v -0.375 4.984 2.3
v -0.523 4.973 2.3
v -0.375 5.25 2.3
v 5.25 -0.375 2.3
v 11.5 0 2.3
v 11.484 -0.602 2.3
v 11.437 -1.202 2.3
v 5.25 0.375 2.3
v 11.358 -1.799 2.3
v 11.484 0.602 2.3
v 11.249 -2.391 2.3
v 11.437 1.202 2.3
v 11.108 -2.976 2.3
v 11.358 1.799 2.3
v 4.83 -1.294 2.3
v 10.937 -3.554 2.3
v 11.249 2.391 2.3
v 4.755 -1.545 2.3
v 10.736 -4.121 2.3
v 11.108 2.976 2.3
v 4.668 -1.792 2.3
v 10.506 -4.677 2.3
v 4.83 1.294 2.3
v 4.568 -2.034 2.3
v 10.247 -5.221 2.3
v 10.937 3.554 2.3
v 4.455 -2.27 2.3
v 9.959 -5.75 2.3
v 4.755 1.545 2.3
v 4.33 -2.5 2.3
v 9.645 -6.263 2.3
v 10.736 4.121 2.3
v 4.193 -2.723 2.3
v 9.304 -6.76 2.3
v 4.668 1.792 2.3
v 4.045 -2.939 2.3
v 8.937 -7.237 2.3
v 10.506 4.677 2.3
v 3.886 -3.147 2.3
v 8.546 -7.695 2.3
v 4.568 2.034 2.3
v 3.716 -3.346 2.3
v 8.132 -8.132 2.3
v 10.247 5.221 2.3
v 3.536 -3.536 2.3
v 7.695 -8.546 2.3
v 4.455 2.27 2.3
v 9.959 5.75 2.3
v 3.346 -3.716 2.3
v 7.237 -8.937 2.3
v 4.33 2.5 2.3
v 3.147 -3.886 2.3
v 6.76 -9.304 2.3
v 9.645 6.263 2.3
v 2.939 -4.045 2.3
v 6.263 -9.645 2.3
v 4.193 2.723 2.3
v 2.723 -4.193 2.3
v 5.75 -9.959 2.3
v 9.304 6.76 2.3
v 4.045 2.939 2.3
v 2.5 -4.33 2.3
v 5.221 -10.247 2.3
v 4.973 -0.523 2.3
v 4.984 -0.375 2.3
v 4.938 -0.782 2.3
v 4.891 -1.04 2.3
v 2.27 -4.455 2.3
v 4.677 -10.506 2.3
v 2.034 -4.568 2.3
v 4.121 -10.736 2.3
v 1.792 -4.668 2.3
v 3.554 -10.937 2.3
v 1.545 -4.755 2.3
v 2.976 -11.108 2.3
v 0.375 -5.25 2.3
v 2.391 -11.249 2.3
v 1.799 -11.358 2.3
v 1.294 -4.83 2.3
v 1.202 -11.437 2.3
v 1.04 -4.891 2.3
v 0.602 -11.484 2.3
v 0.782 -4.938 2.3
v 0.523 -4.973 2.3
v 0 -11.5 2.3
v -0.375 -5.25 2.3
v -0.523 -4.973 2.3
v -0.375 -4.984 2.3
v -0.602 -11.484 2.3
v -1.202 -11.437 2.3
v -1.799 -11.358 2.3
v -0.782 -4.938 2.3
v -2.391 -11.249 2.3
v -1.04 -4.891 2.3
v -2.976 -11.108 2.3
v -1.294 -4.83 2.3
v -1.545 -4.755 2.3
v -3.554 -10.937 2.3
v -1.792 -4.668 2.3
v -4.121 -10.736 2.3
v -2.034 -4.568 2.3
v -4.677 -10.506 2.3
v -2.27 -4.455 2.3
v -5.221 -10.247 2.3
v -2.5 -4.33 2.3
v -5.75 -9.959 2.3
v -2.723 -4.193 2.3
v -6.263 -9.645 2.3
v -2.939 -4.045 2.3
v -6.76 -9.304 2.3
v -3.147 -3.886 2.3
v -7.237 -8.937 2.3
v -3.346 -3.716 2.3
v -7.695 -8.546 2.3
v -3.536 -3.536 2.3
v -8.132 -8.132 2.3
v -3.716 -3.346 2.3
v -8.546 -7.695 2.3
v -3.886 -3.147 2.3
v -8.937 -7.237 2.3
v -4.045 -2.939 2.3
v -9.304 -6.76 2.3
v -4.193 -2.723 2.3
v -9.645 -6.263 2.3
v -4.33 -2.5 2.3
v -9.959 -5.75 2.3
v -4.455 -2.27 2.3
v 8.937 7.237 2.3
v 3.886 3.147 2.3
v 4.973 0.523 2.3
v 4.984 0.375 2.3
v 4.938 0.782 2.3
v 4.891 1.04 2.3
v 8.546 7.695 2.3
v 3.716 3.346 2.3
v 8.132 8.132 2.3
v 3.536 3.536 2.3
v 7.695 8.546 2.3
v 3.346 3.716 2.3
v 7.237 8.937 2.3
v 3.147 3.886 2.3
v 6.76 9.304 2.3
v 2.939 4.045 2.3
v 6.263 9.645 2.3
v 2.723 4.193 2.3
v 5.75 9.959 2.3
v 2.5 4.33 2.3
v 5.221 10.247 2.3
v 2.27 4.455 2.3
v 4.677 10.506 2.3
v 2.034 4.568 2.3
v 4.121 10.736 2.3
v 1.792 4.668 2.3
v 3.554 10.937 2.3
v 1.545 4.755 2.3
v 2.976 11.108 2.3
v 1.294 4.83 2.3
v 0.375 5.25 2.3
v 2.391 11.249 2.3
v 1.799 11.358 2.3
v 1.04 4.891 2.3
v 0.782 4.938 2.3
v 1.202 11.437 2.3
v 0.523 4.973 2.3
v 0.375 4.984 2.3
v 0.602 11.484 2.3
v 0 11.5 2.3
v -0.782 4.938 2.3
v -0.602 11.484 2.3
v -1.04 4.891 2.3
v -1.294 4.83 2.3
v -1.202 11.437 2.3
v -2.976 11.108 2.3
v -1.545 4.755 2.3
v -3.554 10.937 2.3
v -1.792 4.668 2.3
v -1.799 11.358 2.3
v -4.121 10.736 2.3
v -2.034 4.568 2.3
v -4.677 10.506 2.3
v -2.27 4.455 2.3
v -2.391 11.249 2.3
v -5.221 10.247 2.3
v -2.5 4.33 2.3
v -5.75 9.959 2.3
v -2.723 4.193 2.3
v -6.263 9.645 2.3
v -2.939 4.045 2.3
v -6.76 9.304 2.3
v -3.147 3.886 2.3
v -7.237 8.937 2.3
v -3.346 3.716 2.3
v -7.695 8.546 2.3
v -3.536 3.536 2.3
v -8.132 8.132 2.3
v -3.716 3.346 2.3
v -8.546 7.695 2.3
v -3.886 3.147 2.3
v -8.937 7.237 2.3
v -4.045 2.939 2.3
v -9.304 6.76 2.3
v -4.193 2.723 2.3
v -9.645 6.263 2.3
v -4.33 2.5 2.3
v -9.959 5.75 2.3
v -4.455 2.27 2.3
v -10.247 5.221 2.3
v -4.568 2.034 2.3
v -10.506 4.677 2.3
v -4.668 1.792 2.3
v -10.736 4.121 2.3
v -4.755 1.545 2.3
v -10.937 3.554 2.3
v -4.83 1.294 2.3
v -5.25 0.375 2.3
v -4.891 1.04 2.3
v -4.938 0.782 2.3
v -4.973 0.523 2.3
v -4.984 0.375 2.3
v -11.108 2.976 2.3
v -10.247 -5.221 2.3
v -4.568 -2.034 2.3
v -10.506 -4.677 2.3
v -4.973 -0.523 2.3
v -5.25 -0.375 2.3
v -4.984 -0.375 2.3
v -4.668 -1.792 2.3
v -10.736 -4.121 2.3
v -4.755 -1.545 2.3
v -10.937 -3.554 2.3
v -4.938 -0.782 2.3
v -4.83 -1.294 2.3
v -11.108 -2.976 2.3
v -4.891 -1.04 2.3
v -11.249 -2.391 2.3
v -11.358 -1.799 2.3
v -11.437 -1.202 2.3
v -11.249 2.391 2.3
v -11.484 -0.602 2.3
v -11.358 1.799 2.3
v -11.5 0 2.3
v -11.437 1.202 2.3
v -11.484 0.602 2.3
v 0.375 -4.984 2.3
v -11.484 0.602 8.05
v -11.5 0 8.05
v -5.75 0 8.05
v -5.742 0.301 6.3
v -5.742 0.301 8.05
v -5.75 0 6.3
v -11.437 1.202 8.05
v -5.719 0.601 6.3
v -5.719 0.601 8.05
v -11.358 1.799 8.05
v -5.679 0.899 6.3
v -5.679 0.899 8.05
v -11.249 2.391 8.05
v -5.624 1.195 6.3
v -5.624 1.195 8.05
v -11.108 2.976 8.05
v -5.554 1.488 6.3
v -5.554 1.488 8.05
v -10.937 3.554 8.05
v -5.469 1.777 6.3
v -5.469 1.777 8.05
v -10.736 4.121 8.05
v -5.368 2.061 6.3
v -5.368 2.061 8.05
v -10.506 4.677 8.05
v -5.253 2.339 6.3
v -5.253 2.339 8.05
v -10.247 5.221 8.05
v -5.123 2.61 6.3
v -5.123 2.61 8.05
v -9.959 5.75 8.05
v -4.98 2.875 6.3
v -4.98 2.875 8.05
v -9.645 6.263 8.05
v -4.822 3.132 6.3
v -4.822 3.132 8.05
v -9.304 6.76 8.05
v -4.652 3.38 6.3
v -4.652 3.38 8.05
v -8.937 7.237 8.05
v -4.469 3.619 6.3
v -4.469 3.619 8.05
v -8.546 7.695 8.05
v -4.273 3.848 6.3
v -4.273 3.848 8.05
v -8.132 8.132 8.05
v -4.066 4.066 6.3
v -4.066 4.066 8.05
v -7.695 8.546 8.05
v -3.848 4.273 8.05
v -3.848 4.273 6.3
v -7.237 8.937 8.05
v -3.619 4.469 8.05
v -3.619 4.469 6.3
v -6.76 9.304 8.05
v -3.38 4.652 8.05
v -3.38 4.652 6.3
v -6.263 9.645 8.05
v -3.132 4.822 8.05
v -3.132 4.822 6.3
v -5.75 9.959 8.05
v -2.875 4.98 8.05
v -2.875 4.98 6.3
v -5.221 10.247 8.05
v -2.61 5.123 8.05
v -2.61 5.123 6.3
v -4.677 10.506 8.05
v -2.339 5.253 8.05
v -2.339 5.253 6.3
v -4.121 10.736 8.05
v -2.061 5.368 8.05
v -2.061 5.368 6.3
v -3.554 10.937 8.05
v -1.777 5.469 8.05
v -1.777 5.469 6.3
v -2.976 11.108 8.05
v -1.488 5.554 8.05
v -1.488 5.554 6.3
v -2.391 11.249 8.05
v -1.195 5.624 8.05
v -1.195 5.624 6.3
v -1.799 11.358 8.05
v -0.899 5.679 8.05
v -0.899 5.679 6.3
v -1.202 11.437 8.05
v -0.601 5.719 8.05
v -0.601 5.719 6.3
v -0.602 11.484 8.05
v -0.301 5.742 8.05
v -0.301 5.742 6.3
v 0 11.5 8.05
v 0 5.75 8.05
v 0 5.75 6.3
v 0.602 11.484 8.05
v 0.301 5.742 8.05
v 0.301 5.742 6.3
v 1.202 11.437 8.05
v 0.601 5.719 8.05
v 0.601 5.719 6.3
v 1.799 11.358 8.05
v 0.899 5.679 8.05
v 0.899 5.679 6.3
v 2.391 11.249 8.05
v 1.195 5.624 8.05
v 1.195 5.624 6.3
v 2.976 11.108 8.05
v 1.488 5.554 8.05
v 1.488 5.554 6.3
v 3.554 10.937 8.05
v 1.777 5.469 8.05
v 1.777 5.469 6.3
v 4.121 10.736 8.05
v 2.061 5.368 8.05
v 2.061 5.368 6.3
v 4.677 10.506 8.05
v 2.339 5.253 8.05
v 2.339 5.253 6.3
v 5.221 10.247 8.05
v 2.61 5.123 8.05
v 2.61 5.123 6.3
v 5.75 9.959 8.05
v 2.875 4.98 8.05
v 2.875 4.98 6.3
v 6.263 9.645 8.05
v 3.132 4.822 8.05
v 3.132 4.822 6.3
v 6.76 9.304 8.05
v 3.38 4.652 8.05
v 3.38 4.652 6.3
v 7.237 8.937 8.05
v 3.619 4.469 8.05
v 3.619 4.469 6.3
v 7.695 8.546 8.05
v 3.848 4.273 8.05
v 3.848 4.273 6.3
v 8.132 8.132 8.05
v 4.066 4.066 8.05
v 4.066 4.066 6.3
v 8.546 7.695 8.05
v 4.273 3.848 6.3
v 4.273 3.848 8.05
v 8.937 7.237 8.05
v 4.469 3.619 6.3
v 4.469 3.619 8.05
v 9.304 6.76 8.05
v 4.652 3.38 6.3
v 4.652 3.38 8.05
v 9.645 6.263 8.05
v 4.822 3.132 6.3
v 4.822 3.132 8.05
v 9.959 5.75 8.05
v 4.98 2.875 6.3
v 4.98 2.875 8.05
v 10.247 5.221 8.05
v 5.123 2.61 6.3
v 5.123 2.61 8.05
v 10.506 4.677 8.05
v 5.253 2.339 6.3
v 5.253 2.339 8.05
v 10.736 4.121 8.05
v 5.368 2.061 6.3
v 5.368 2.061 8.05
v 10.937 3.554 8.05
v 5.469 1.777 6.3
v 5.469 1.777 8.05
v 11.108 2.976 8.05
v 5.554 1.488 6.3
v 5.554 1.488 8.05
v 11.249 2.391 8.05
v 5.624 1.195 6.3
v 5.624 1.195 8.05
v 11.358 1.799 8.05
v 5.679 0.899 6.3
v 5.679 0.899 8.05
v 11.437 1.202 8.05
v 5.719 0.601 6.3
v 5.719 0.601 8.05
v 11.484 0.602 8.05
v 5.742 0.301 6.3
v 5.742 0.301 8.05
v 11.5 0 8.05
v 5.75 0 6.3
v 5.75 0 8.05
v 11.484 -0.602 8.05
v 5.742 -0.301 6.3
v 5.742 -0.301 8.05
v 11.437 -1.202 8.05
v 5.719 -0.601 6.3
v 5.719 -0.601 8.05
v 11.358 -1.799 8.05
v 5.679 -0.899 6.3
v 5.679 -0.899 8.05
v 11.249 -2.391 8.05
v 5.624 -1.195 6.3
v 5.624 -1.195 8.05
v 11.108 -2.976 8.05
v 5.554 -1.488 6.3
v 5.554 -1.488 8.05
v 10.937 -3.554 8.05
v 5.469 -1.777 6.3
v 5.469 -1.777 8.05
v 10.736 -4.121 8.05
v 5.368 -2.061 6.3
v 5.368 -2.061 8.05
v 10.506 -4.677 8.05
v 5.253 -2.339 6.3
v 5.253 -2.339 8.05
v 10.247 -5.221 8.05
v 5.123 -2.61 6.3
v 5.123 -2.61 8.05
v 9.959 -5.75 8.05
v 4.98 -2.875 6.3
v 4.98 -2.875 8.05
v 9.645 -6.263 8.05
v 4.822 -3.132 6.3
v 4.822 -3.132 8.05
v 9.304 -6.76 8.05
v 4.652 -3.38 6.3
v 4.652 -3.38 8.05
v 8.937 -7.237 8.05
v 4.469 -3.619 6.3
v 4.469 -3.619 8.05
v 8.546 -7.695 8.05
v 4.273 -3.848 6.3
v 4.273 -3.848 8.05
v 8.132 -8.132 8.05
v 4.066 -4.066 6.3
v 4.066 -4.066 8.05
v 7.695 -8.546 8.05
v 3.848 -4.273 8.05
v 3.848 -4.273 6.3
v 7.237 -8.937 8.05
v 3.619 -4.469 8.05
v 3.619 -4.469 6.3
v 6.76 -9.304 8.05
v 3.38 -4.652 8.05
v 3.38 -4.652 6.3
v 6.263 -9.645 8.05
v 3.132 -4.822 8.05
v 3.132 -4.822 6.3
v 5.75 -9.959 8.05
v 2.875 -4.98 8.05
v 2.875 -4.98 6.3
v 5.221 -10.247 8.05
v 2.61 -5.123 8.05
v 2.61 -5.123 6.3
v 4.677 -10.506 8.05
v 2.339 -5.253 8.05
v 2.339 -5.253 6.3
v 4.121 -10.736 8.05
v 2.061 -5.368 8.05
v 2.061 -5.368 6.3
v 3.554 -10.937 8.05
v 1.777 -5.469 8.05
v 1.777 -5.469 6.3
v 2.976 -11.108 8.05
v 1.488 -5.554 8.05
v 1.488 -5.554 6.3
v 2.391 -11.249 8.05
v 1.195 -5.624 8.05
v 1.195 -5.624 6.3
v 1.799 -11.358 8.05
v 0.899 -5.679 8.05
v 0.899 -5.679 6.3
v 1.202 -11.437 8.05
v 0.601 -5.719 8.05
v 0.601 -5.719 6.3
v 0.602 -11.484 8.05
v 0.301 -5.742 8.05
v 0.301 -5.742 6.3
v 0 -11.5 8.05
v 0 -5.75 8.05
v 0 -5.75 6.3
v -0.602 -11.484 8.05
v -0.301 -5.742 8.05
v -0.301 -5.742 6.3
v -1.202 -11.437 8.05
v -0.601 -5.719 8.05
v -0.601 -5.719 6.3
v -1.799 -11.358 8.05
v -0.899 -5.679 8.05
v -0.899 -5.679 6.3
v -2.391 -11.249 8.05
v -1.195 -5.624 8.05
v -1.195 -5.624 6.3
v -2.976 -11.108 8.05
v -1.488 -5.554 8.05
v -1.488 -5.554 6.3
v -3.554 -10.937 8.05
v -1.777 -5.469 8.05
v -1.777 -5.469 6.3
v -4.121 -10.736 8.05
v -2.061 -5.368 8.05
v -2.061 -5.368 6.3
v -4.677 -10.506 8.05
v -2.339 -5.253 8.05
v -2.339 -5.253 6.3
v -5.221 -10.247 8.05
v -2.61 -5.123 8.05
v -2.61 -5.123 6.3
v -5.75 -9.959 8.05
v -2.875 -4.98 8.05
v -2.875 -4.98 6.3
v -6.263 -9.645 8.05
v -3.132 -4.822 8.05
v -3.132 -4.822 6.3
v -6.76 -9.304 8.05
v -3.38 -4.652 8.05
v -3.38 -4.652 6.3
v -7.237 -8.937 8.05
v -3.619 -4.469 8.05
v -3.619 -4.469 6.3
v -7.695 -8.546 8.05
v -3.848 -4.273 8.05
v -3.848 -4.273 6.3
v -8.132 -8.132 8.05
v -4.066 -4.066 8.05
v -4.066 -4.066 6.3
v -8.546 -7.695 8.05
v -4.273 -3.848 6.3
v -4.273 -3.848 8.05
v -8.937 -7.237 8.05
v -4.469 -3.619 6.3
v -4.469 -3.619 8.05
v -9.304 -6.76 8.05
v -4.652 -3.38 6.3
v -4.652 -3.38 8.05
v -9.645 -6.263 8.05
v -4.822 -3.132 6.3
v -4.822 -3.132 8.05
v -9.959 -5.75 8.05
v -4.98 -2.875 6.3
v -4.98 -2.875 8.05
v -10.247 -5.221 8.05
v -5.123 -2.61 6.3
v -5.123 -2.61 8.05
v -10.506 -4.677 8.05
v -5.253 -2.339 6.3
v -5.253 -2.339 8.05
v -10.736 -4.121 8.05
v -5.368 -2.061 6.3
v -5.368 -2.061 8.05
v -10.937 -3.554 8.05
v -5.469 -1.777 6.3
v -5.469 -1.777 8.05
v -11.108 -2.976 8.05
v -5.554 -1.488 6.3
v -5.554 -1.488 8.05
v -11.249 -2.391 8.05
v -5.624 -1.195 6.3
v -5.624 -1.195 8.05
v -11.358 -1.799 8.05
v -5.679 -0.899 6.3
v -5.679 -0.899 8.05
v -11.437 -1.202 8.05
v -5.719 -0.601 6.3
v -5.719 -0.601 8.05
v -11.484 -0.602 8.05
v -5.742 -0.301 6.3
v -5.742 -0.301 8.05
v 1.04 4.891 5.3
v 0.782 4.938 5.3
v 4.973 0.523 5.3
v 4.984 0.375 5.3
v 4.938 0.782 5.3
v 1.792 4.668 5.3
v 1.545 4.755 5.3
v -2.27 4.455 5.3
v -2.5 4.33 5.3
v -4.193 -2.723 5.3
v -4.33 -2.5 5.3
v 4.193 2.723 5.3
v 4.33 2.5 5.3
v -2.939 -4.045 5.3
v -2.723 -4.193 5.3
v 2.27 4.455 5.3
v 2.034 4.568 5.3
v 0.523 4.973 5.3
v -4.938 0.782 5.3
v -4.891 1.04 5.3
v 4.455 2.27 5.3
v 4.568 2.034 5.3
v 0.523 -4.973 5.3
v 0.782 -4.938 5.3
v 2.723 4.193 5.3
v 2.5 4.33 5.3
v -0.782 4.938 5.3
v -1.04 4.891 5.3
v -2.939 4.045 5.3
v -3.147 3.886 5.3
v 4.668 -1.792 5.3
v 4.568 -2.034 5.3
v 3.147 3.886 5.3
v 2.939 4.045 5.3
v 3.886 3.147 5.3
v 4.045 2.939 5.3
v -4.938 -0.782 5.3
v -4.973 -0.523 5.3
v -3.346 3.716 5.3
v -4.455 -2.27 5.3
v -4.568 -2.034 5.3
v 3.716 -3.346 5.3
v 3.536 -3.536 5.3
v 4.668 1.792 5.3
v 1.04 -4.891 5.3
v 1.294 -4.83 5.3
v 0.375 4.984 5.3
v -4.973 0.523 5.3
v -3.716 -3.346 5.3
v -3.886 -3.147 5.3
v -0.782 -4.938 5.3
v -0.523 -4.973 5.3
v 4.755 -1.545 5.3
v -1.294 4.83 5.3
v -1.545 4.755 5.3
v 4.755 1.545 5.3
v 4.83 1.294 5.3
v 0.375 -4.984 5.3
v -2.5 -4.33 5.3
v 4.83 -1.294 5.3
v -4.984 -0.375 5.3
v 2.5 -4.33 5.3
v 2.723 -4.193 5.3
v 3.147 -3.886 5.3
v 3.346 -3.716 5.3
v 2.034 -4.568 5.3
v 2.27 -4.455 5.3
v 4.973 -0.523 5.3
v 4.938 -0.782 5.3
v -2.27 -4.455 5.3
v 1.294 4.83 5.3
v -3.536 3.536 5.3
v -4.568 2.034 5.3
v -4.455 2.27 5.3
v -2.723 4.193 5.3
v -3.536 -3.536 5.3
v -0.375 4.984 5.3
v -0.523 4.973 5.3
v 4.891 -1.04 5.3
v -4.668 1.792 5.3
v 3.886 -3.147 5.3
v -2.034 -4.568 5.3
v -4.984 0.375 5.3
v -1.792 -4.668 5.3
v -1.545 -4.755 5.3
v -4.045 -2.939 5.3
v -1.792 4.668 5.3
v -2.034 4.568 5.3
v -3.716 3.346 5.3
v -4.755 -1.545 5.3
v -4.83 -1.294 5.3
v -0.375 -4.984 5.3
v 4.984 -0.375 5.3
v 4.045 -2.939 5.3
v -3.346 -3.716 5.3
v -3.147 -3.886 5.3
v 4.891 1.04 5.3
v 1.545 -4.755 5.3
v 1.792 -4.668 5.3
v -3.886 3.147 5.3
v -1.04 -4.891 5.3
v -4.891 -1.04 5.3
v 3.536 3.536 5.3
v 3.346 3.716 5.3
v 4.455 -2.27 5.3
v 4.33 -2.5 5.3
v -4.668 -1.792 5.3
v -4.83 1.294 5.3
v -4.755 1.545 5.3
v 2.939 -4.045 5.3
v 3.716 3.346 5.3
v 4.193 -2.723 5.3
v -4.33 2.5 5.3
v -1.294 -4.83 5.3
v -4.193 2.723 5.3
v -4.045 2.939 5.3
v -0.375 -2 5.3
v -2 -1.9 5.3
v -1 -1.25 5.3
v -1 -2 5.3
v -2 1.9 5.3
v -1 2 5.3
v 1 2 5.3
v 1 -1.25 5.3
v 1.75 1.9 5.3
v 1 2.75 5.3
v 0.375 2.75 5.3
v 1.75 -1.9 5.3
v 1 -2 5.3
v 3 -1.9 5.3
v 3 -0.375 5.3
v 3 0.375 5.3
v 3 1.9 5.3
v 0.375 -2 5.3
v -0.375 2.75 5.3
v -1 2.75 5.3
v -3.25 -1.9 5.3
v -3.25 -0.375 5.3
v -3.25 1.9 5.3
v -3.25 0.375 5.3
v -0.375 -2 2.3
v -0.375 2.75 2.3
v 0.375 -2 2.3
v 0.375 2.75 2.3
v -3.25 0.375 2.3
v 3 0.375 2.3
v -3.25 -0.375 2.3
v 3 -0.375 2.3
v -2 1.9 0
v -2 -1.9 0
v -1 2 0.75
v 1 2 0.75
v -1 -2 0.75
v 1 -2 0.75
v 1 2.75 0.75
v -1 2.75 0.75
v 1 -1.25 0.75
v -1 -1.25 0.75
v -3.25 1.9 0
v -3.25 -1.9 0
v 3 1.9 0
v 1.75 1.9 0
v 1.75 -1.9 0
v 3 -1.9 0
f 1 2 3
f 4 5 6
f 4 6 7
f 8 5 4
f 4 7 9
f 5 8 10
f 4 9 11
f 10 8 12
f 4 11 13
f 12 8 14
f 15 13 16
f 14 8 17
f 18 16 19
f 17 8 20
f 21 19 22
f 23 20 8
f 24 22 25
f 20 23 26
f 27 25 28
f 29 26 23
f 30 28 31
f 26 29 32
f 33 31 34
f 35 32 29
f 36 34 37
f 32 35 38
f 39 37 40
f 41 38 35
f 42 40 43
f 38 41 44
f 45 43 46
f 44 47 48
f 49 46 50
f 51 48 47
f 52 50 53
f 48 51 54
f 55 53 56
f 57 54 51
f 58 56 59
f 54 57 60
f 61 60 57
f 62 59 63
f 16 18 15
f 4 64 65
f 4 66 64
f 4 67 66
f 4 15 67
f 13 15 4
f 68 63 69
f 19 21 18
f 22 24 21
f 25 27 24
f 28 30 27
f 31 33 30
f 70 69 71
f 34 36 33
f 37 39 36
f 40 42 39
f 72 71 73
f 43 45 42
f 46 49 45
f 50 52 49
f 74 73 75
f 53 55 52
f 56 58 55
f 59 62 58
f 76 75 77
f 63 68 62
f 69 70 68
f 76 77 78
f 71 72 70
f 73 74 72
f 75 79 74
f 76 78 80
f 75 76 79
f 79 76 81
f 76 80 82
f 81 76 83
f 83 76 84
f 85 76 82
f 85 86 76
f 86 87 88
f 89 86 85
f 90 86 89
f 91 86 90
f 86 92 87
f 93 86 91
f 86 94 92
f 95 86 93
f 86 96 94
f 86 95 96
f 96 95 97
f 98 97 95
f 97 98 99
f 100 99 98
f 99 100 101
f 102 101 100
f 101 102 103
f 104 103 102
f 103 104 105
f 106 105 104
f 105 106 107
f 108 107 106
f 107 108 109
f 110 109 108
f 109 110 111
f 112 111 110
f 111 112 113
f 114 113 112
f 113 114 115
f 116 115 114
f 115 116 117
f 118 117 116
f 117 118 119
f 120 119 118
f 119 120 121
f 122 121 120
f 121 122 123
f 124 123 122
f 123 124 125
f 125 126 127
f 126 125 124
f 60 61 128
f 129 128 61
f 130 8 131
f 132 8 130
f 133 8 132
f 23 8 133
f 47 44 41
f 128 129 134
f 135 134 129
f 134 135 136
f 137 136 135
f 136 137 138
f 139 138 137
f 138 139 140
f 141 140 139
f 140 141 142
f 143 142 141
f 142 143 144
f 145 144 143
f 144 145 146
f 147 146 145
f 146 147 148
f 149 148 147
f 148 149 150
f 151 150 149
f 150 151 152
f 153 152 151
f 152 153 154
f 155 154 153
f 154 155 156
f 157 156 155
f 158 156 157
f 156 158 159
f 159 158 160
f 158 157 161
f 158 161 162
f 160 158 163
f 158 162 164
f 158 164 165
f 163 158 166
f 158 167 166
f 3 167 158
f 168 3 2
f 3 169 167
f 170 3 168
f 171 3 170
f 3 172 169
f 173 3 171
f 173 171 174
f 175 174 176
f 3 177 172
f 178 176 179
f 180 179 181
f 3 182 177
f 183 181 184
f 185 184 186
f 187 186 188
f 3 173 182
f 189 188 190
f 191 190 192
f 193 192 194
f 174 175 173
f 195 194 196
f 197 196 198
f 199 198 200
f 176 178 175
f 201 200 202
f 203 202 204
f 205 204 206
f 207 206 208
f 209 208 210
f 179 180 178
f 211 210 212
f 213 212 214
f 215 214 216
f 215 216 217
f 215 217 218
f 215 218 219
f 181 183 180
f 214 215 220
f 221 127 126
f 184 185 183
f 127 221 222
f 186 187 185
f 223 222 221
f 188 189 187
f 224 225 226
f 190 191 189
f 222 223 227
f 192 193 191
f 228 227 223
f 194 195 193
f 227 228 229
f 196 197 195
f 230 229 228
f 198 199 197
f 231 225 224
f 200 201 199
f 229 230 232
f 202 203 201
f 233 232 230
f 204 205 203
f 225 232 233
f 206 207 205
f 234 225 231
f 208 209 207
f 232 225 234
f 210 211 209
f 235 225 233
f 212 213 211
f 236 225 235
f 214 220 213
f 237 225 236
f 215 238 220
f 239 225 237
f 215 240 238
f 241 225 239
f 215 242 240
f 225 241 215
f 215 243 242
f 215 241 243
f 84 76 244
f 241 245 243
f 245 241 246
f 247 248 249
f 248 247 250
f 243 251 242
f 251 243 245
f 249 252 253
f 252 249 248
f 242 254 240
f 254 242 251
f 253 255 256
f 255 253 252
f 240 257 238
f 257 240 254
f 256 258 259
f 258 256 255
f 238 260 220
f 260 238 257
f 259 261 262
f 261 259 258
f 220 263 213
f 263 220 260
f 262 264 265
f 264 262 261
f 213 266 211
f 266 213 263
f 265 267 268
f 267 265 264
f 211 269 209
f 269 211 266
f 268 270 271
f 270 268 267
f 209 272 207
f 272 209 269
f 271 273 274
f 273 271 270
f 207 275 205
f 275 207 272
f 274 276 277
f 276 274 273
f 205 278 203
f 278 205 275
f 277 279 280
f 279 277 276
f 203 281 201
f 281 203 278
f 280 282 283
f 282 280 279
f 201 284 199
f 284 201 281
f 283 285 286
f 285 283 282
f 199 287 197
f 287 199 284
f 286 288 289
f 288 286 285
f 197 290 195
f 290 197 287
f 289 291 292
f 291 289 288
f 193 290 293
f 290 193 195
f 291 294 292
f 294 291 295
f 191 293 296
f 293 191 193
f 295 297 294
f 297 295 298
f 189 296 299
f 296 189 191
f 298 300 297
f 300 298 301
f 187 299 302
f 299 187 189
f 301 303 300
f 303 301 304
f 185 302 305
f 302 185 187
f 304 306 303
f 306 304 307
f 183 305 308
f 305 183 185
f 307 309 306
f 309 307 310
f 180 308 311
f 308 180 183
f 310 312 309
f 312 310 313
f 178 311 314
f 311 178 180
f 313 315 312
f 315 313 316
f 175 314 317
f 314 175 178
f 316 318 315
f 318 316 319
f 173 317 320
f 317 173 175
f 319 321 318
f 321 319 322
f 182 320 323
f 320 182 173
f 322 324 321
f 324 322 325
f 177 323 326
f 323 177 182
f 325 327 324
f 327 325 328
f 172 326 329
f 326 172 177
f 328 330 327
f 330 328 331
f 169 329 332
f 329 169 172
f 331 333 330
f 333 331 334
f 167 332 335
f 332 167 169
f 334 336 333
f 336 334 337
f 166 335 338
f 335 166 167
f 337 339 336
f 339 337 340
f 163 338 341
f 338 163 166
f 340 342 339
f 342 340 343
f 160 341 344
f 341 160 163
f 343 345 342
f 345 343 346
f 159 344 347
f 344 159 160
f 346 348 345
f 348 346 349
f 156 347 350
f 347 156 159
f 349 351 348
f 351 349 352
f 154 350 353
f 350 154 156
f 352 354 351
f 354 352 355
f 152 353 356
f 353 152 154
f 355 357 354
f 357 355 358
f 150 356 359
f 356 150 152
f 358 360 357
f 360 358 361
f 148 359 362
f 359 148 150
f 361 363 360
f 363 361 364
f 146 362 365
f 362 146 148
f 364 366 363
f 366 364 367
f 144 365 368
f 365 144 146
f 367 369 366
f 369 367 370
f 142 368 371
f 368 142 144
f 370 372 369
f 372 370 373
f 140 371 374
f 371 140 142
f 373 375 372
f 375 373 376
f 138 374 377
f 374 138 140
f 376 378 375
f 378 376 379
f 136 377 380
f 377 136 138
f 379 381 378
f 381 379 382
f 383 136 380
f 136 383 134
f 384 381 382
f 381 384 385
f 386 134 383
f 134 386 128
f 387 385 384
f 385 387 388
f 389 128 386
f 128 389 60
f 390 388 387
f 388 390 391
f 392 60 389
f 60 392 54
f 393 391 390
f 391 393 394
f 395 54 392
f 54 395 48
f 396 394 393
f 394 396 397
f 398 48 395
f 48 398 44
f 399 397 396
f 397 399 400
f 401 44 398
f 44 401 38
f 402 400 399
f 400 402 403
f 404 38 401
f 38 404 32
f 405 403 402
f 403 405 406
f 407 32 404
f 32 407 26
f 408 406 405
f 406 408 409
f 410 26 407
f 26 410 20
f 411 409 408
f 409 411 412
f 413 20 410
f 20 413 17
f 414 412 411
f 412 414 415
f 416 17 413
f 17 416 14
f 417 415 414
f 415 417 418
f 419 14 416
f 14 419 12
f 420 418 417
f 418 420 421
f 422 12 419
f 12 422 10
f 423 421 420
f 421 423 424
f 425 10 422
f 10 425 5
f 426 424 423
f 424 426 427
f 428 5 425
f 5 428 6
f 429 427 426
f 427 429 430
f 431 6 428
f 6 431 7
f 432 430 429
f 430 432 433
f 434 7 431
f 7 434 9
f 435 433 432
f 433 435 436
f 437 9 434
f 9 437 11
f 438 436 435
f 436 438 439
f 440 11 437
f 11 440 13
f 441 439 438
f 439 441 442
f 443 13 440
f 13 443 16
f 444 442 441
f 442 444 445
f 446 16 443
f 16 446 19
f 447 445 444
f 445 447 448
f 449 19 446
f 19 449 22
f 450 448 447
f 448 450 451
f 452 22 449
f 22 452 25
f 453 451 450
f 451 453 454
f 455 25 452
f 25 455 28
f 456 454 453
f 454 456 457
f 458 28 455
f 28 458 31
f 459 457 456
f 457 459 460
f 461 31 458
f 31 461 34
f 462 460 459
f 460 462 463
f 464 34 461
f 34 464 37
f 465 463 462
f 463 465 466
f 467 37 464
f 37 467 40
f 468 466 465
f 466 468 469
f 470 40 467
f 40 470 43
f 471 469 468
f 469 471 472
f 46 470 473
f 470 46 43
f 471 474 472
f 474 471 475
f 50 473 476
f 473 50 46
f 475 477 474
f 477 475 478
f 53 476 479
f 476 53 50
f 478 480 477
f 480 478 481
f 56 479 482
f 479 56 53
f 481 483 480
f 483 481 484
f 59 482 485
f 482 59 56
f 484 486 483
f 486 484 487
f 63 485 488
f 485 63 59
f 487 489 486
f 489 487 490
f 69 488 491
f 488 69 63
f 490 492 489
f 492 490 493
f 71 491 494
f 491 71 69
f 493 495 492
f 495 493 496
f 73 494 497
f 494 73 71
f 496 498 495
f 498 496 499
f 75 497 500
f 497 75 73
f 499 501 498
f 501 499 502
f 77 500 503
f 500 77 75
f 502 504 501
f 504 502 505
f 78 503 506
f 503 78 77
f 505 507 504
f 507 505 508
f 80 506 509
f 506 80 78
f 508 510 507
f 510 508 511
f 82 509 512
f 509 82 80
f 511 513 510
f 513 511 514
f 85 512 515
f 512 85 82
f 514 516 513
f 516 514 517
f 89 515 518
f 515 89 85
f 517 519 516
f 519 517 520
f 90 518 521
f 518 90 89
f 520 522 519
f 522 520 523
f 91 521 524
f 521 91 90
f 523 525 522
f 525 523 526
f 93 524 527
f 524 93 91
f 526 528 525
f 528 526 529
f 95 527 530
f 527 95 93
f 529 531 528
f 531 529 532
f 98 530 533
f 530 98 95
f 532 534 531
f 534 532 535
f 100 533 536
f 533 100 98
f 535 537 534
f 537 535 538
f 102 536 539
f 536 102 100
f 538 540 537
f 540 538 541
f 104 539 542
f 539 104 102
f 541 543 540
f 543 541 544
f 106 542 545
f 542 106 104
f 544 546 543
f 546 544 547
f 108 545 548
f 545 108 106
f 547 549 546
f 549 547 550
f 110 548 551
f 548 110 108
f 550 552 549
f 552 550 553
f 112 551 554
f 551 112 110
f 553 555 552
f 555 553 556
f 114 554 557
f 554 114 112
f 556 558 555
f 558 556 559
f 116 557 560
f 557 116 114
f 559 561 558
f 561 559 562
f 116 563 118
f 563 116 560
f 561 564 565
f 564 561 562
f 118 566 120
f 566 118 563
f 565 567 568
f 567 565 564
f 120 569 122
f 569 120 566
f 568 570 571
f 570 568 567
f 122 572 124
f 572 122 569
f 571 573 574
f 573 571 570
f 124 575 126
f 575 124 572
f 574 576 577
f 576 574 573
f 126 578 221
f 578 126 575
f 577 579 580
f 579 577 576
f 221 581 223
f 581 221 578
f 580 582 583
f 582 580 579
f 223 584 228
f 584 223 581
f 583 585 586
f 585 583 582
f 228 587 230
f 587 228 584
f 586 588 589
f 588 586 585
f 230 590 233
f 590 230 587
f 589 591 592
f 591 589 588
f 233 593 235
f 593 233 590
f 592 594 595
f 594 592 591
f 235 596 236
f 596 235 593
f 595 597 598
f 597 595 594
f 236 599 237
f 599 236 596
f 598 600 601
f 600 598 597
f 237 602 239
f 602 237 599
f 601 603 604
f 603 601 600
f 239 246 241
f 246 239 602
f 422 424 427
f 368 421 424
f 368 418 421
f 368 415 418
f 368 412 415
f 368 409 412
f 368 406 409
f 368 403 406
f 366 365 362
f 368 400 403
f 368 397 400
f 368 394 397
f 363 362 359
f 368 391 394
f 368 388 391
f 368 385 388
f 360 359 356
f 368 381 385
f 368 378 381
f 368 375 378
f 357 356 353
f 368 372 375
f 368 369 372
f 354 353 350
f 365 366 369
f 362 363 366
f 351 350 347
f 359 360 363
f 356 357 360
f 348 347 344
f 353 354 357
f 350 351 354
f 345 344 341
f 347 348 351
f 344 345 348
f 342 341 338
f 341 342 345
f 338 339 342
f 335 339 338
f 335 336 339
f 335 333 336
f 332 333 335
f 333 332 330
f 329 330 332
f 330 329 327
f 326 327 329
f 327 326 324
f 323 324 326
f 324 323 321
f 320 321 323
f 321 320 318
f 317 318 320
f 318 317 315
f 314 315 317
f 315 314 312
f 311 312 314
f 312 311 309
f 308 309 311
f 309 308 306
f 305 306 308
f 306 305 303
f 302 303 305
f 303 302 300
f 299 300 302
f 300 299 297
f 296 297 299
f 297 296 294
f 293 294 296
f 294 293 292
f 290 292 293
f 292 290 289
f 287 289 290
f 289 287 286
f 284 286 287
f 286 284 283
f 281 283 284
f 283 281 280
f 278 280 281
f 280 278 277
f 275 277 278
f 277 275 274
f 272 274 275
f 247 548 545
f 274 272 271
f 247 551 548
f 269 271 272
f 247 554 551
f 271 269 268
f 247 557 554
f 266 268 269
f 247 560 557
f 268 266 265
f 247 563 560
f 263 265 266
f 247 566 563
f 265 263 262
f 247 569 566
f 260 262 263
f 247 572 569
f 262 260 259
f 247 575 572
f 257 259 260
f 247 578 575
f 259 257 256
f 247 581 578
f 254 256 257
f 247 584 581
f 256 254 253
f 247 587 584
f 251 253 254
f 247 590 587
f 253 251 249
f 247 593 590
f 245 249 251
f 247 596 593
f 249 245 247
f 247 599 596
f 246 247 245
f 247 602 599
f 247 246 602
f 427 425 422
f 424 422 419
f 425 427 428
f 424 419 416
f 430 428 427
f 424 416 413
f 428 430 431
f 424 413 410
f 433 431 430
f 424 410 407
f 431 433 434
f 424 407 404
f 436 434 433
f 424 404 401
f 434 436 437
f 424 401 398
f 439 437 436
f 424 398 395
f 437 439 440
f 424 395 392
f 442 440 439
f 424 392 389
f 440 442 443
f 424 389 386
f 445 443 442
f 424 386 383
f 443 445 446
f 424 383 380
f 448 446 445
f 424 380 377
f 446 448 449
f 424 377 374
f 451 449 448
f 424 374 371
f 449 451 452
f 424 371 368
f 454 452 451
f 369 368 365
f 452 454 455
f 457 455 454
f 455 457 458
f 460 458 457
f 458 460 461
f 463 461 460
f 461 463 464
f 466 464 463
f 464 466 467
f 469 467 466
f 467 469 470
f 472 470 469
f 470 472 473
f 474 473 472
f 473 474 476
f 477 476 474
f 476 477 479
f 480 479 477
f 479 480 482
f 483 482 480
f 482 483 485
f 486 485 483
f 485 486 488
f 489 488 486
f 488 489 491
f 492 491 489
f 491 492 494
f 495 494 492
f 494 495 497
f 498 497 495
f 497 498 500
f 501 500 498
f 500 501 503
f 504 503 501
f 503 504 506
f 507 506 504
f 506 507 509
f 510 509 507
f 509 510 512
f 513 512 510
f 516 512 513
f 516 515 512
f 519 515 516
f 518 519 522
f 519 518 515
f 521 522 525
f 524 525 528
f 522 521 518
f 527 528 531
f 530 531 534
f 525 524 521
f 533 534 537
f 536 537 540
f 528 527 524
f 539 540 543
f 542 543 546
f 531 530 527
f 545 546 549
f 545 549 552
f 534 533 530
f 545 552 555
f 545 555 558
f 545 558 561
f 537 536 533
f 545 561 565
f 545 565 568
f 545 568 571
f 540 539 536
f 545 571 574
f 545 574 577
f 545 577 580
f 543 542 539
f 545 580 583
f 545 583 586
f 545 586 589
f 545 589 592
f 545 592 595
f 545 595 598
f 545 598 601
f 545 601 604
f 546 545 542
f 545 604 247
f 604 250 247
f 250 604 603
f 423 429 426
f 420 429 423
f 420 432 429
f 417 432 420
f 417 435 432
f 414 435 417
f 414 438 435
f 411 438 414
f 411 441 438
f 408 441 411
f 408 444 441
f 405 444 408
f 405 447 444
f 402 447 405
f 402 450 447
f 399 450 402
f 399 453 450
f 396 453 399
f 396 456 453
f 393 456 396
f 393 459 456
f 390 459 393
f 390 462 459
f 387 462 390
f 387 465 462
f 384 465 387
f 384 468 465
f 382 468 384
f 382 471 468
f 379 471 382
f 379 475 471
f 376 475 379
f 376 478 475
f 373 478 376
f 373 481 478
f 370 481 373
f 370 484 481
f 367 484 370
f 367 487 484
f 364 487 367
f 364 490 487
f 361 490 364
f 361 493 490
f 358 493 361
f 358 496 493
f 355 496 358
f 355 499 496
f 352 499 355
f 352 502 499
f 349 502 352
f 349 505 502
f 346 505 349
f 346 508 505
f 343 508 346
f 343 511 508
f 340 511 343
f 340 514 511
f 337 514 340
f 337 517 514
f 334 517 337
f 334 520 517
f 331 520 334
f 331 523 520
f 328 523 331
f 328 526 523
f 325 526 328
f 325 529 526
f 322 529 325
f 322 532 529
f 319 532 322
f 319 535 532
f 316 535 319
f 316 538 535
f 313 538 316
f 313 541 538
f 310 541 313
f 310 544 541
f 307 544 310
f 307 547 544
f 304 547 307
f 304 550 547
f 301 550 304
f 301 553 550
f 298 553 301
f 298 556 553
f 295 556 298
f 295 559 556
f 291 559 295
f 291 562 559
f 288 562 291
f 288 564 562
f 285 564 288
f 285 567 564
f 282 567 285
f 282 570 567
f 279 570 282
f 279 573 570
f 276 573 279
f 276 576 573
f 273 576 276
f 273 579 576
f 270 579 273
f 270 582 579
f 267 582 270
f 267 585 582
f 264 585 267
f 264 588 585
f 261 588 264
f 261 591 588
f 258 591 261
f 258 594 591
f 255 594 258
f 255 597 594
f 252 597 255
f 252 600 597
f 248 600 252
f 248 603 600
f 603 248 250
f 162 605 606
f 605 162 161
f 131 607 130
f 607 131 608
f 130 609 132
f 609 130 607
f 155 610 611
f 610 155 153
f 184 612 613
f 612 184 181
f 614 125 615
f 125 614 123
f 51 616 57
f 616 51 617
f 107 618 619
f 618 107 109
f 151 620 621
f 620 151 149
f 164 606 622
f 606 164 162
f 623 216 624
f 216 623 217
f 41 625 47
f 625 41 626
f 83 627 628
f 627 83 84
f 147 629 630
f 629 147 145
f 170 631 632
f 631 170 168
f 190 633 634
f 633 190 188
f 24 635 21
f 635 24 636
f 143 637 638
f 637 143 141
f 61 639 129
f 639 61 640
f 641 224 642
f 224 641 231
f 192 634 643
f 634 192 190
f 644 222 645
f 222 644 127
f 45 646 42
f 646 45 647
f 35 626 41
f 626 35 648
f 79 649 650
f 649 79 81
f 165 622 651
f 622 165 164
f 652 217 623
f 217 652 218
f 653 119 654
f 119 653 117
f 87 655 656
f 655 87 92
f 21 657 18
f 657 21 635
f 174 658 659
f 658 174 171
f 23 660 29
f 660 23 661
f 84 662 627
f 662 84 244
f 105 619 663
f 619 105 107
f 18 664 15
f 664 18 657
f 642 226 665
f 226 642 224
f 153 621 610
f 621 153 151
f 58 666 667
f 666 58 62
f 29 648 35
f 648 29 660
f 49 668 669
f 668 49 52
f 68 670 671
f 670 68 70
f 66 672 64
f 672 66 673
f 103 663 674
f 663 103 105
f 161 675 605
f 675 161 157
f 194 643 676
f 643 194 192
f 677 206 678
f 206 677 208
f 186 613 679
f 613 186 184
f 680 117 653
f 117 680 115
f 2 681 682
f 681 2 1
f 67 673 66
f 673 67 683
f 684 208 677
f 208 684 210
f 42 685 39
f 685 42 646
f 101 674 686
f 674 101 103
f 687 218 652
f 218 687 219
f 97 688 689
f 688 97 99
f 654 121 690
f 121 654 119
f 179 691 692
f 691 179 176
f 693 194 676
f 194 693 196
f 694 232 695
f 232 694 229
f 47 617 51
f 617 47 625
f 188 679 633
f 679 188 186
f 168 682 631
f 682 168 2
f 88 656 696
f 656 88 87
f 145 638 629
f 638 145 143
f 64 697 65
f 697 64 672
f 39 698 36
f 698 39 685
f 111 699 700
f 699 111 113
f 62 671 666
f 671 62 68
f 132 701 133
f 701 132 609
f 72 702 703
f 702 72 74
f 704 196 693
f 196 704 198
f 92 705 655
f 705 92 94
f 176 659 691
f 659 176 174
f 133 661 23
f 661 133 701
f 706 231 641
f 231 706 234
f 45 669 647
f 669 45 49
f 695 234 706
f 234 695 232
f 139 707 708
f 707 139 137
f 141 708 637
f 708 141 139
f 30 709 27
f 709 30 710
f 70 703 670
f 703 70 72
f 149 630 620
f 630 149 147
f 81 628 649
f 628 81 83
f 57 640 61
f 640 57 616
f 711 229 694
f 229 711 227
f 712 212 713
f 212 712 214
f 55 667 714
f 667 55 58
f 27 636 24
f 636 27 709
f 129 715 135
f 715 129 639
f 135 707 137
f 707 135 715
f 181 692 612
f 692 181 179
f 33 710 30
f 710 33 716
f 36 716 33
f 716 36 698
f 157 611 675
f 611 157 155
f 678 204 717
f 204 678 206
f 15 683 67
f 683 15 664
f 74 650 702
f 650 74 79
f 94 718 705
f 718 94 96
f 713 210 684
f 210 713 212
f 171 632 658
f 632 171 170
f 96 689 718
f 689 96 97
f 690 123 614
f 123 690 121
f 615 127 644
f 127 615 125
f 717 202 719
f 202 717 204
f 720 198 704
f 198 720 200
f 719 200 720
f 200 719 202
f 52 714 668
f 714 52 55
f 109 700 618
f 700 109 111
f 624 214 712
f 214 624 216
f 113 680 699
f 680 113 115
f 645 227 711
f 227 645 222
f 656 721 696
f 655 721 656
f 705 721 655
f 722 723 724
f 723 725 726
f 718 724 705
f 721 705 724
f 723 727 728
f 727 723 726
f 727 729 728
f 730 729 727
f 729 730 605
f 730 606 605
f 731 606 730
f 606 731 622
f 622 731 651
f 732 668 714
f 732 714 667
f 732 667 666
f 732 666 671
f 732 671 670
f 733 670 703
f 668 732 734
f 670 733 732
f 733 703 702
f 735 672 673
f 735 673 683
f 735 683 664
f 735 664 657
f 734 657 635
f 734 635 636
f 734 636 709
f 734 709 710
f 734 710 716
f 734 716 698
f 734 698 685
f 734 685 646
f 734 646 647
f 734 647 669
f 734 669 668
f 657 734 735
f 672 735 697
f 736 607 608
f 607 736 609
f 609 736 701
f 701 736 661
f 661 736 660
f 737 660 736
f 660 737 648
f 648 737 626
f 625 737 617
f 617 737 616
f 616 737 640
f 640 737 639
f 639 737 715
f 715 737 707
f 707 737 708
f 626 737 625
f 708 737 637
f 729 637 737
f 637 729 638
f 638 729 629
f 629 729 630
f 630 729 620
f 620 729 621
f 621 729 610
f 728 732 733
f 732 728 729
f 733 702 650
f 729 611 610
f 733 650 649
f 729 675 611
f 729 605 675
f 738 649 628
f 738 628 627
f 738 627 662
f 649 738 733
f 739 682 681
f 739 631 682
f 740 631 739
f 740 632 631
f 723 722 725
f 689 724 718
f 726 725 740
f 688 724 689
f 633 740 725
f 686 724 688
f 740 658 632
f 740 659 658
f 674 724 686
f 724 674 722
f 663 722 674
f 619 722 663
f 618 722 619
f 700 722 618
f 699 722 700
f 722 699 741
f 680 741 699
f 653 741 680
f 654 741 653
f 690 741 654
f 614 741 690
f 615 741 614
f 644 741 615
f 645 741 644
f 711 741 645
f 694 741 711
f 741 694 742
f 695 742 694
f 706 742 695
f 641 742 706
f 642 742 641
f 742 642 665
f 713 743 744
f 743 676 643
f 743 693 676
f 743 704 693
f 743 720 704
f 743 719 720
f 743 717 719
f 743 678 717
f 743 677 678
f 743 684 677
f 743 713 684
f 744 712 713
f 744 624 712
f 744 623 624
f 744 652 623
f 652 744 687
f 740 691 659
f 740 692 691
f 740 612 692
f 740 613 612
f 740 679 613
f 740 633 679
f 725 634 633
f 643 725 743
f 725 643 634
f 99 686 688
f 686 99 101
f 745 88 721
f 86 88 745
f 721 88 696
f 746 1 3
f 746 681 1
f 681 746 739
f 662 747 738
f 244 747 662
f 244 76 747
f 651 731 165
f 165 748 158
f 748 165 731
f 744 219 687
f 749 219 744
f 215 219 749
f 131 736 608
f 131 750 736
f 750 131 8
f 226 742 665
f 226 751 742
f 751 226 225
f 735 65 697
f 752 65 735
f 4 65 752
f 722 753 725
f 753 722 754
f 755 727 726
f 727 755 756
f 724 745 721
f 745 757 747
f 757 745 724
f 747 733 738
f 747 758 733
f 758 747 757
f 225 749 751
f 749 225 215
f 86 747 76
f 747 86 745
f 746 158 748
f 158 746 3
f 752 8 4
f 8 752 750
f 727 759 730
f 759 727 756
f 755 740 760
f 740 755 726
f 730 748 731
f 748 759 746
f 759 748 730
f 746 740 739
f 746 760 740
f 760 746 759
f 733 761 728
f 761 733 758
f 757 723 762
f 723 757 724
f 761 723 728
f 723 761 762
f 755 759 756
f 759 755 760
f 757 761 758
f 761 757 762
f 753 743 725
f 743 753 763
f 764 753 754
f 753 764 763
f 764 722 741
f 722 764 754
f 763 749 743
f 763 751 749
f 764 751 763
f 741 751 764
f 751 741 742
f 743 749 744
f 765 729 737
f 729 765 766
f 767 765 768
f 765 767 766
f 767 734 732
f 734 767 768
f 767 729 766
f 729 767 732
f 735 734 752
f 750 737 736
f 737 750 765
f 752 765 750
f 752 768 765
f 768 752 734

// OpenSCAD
$fn=120;

r=11.5/2;

module rotate(a)
{
 cx = cos(a[0]);
 cy = cos(a[1]);
 cz = cos(a[2]);
 sx = sin(a[0]);
 sy = sin(a[1]);
 sz = sin(a[2]);
 multmatrix([
  [cy * cz, cz * sx * sy - cx * sz, cx * cz * sy + sx * sz, 0],
  [cy * sz, cx * cz + sx * sy * sz,-cz * sx + cx * sy * sz, 0],
  [-sy,     cy * sx,                cx * cy,                0],
  [0,       0,                      0,                      1]
 ]) children();
}

module cylinder_fillet(r2) {
    difference() {
        translate([0, 0, r2+1])
        rotate([180, 0, 0])
        difference() {
            rotate_extrude(convexity=5)
                translate([r2,0,0])
                    square(r2,r2);
            
            rotate_extrude(convexity=10)
                    translate([r2-1,r2-1,0])
                        circle(r=r2-1);
        }
        
        translate([-25, -25, 0]) cube([50, 50, 2]);
    }
}

translate([0, 0, 2.3]) {
    difference() {
        union() {
            cylinder(h=1.35, r=r+.75);
            cylinder(h=4, r=r);
            difference() {
            rotate_extrude(convexity=5)
                translate([r,0,0])
                    square(r,r);
            
            rotate_extrude(convexity=10)
                    translate([r-1,r-1,0])
                        circle(r=r-1);
        }
        }
        
        translate([0, 0, -1])
            cylinder(h=4, r=5);
    
        //translate([0, 0, -1]) 
        //cylinder_fillet(r-1);
        
    }
}

difference() {
    union() {
        rotate([0, 0, 90])
        translate([-r+.5, -.75/2, 0])
            cube([r*2-1, .75, 6]);

        translate([-r+.5, -.75/2, 0])
            cube([r*2-1, .75, 6]);
    }
    
    cube([4, 4, 11], center=true);
    cube([20, 20, 4.6], center=true);
}

difference () {
    union () {
        translate([-1, 2, 0])
            cube([2, 0.75, 6]);
        translate([-1, -2, 0])
            cube([2, 0.75, 6]);
    }
    cube([3, 20, 1.5], center=true);
}

translate([.5, 0, 0])
rotate([0, 0, 90]) {
    translate([-1.9, 2.5, 0])
        cube([3.8, 1.25, 6]);
    translate([-1.9, -2.5, 0])
        cube([3.8, 1.25, 6]);
}
